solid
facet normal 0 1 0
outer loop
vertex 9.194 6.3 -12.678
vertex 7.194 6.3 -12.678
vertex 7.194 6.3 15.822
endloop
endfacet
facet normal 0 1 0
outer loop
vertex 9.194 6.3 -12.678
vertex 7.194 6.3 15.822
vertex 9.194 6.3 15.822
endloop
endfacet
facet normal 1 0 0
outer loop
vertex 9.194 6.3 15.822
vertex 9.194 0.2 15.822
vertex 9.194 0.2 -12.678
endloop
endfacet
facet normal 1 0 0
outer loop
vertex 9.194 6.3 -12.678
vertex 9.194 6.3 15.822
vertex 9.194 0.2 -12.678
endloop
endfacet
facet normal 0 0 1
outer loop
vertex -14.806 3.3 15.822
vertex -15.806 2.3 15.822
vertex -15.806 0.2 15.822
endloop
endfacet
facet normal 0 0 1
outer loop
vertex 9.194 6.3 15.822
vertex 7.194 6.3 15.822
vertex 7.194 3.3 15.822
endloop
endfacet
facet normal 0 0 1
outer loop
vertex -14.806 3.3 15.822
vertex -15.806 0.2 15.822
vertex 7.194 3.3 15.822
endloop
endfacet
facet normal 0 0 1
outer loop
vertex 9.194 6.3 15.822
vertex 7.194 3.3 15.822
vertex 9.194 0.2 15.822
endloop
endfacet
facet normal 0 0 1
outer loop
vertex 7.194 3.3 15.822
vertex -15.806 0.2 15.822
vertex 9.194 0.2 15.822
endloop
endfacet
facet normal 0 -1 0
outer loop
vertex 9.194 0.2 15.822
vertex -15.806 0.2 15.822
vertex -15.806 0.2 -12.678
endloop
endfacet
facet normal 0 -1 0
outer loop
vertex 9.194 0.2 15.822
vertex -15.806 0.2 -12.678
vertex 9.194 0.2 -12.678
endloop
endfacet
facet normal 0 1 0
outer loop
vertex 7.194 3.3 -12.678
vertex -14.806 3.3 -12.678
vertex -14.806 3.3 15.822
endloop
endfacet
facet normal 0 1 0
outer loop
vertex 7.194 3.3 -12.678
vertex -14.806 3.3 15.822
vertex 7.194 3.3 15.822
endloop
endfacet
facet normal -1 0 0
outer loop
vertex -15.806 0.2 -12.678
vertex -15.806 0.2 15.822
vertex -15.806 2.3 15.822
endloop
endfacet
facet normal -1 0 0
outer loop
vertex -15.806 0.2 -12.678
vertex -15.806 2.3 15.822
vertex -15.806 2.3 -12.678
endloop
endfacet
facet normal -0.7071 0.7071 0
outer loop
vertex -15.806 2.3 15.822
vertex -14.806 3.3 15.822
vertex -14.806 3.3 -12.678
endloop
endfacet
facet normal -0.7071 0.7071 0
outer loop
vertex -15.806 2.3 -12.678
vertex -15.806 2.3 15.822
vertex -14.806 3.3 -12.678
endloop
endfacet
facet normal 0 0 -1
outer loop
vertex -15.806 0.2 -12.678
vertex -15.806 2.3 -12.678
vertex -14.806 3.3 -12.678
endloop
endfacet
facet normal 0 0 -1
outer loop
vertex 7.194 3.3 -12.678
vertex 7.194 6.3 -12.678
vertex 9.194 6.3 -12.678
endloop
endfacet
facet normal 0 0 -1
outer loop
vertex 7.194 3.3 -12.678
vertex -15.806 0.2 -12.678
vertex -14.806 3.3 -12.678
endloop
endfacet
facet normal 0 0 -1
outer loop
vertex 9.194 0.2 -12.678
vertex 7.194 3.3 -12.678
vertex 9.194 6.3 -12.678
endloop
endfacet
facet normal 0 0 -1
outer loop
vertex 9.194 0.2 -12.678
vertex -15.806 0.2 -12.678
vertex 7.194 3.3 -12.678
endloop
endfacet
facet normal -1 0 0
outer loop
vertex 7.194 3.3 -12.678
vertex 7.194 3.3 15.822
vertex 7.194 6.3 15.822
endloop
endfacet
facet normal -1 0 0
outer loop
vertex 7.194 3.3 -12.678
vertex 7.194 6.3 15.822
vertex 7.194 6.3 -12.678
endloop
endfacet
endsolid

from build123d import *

# Parameters (mm, degrees)
SKETCH1_W           = 25
SKETCH1_H           = 28.5
BOSS_EXTRUDE1_DEPTH = 3.3
SKETCH2_W           = 2
SKETCH2_H           = 28.5
BOSS_EXTRUDE2_DEPTH = 3
CHAMFER1_SIZE       = 1
SKETCH3_R           = 21.891628128
CUT_EXTRUDE1_DEPTH  = 0.2


with BuildPart() as part:
    # Sketch1 → Boss-Extrude1 (new body)
    with BuildSketch(Plane(origin=(0, 0, 0), x_dir=(1, 0, 0), z_dir=(0, 1, 0))):
        with Locations((-3.305606618, -1.571691176)):
            Rectangle(SKETCH1_W, SKETCH1_H)
    extrude(amount=BOSS_EXTRUDE1_DEPTH)

    # Sketch2 → Boss-Extrude2 (add)
    with BuildSketch(Plane(origin=(0, 3.3, 0), x_dir=(1, 0, 0), z_dir=(0, 1, 0))):
        with Locations((8.194393382, -1.571691176)):
            Rectangle(SKETCH2_W, SKETCH2_H)
    extrude(amount=BOSS_EXTRUDE2_DEPTH)

    # Chamfer1
    chamfer1_edges = [part.edges().sort_by_distance(p)[0] for p in [
        (-15.805606618, 3.3, 1.571691176),
    ]]
    chamfer(chamfer1_edges, length=CHAMFER1_SIZE)

    # Sketch3 → Cut-Extrude1 (cut)
    with BuildSketch(Plane.XZ):
        with Locations((-2.847820653, 0)):
            Circle(SKETCH3_R)
    extrude(amount=-CUT_EXTRUDE1_DEPTH, mode=Mode.SUBTRACT)


solid = part.part
